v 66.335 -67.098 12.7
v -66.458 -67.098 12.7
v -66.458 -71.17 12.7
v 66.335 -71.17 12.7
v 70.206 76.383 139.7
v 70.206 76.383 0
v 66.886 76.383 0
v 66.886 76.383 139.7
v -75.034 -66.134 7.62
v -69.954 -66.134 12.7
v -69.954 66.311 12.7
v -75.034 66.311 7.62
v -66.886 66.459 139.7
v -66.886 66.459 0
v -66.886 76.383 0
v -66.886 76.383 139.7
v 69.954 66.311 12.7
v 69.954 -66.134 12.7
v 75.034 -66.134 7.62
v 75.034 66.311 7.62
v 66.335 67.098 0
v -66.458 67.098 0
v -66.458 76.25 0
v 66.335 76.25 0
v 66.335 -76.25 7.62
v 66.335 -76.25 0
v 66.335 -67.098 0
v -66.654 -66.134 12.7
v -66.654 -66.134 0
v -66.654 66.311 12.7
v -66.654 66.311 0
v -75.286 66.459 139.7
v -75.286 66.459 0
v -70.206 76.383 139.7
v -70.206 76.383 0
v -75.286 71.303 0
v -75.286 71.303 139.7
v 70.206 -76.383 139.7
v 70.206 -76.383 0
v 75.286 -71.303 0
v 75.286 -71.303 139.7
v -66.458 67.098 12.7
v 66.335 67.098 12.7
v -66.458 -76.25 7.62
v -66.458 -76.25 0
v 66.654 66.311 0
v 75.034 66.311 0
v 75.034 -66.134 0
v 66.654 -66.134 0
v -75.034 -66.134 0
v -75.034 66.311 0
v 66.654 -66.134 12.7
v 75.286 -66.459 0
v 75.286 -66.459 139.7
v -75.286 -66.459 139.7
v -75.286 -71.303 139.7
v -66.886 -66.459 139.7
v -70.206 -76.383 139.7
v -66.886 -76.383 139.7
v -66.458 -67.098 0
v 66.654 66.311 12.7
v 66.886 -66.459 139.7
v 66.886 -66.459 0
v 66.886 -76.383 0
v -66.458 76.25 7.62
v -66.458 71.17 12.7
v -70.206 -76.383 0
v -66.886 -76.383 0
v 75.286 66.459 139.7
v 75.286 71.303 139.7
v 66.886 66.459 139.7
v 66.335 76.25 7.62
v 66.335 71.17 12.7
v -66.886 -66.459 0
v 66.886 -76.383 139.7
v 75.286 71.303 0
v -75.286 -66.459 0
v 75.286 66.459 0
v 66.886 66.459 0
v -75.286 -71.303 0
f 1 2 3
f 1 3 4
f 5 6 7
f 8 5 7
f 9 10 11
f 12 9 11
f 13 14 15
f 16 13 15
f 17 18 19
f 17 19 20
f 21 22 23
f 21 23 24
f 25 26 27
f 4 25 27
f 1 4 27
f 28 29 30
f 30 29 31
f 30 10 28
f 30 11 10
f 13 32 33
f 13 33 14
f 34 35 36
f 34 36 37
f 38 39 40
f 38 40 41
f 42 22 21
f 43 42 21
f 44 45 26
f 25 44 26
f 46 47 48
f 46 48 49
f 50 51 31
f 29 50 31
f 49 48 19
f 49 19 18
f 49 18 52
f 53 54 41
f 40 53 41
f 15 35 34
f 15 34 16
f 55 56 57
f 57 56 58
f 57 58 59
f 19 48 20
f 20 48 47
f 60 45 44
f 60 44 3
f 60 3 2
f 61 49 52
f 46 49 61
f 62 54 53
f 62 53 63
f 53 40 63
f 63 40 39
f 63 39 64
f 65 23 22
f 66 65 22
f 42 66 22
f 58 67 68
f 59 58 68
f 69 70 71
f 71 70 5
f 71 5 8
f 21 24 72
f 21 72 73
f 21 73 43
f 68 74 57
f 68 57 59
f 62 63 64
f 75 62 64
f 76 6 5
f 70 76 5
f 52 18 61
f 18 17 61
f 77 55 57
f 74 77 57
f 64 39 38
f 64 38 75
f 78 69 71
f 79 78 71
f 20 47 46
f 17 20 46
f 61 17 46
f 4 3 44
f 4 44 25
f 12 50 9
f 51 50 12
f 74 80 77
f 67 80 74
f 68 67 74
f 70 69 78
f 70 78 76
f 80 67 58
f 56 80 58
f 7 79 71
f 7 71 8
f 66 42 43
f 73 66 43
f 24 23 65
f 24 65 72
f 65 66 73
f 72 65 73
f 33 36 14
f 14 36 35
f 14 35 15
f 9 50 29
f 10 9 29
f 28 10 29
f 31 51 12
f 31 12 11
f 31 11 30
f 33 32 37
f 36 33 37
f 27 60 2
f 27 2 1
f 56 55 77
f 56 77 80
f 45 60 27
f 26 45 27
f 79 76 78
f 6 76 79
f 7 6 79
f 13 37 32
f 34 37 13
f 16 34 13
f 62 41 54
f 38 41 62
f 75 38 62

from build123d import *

# Parameters (mm, degrees)
F0_W       = 8.399859
F0_H       = 9.923994
F1_DEPTH   = 139.7
F5_W       = 8.380056
F5_H       = 132.445626
F6_DEPTH   = 12.7
F8_W       = 132.792532
F8_H       = 9.151451
F9_DEPTH   = 12.7
F11_SIZE   = 5.08
F12_SIZE   = 5.08
F12_2_SIZE = 5.08


with BuildPart() as f1:
    # F0 (on Top) → F1 (new body)
    with BuildSketch(Plane.XY):
        with Locations((-71.086309, 71.421087)):
            Rectangle(F0_W, F0_H)
    extrude(amount=F1_DEPTH)

    # F11
    f11_edges = [f1.edges().sort_by_distance(p)[0] for p in [
        (-75.286239, 76.383084, 69.85),
    ]]
    chamfer(f11_edges, length=F11_SIZE)


with BuildPart() as f2_1:
    # F2: instance of F1
    add(f1.part.mirror(Plane.YZ))

    # F7: F6, F1 across plane


with BuildPart() as f3_1:
    # F3: instance of F2_1
    add(f2_1.part.mirror(Plane.XZ))


with BuildPart() as f4_1:
    # F4: instance of F3_1
    add(f3_1.part.mirror(Plane.YZ))


with BuildPart() as f6:
    # F5 (on Top) → F6 (new body)
    with BuildSketch(Plane.XY):
        with Locations((-70.843771, 0.088375)):
            Rectangle(F5_W, F5_H)
    extrude(amount=F6_DEPTH)

    # F12#2
    f12_2_edges = [f6.edges().sort_by_distance(p)[0] for p in [
        (-75.033799, 0.088375, 12.7),
    ]]
    chamfer(f12_2_edges, length=F12_2_SIZE)


with BuildPart() as f2_1_1:
    add(f2_1.part)
    add(f6.part.mirror(Plane.YZ))
    add(f1.part.mirror(Plane.YZ))


with BuildPart() as f9:
    # F8 (on Top) → F9 (new body)
    with BuildSketch(Plane.XY):
        with Locations((-0.061363, -71.673903)):
            Rectangle(F8_W, F8_H)
    extrude(amount=F9_DEPTH)

    # F12
    f12_edges = [f9.edges().sort_by_distance(p)[0] for p in [
        (-0.061363, -76.249629, 12.7),
    ]]
    chamfer(f12_edges, length=F12_SIZE)


with BuildPart() as f10_1:
    # F10: instance of F9
    add(f9.part.mirror(Plane.XZ))


solid = Compound([f1.part, f3_1.part, f4_1.part, f6.part, f2_1_1.part, f9.part, f10_1.part])
